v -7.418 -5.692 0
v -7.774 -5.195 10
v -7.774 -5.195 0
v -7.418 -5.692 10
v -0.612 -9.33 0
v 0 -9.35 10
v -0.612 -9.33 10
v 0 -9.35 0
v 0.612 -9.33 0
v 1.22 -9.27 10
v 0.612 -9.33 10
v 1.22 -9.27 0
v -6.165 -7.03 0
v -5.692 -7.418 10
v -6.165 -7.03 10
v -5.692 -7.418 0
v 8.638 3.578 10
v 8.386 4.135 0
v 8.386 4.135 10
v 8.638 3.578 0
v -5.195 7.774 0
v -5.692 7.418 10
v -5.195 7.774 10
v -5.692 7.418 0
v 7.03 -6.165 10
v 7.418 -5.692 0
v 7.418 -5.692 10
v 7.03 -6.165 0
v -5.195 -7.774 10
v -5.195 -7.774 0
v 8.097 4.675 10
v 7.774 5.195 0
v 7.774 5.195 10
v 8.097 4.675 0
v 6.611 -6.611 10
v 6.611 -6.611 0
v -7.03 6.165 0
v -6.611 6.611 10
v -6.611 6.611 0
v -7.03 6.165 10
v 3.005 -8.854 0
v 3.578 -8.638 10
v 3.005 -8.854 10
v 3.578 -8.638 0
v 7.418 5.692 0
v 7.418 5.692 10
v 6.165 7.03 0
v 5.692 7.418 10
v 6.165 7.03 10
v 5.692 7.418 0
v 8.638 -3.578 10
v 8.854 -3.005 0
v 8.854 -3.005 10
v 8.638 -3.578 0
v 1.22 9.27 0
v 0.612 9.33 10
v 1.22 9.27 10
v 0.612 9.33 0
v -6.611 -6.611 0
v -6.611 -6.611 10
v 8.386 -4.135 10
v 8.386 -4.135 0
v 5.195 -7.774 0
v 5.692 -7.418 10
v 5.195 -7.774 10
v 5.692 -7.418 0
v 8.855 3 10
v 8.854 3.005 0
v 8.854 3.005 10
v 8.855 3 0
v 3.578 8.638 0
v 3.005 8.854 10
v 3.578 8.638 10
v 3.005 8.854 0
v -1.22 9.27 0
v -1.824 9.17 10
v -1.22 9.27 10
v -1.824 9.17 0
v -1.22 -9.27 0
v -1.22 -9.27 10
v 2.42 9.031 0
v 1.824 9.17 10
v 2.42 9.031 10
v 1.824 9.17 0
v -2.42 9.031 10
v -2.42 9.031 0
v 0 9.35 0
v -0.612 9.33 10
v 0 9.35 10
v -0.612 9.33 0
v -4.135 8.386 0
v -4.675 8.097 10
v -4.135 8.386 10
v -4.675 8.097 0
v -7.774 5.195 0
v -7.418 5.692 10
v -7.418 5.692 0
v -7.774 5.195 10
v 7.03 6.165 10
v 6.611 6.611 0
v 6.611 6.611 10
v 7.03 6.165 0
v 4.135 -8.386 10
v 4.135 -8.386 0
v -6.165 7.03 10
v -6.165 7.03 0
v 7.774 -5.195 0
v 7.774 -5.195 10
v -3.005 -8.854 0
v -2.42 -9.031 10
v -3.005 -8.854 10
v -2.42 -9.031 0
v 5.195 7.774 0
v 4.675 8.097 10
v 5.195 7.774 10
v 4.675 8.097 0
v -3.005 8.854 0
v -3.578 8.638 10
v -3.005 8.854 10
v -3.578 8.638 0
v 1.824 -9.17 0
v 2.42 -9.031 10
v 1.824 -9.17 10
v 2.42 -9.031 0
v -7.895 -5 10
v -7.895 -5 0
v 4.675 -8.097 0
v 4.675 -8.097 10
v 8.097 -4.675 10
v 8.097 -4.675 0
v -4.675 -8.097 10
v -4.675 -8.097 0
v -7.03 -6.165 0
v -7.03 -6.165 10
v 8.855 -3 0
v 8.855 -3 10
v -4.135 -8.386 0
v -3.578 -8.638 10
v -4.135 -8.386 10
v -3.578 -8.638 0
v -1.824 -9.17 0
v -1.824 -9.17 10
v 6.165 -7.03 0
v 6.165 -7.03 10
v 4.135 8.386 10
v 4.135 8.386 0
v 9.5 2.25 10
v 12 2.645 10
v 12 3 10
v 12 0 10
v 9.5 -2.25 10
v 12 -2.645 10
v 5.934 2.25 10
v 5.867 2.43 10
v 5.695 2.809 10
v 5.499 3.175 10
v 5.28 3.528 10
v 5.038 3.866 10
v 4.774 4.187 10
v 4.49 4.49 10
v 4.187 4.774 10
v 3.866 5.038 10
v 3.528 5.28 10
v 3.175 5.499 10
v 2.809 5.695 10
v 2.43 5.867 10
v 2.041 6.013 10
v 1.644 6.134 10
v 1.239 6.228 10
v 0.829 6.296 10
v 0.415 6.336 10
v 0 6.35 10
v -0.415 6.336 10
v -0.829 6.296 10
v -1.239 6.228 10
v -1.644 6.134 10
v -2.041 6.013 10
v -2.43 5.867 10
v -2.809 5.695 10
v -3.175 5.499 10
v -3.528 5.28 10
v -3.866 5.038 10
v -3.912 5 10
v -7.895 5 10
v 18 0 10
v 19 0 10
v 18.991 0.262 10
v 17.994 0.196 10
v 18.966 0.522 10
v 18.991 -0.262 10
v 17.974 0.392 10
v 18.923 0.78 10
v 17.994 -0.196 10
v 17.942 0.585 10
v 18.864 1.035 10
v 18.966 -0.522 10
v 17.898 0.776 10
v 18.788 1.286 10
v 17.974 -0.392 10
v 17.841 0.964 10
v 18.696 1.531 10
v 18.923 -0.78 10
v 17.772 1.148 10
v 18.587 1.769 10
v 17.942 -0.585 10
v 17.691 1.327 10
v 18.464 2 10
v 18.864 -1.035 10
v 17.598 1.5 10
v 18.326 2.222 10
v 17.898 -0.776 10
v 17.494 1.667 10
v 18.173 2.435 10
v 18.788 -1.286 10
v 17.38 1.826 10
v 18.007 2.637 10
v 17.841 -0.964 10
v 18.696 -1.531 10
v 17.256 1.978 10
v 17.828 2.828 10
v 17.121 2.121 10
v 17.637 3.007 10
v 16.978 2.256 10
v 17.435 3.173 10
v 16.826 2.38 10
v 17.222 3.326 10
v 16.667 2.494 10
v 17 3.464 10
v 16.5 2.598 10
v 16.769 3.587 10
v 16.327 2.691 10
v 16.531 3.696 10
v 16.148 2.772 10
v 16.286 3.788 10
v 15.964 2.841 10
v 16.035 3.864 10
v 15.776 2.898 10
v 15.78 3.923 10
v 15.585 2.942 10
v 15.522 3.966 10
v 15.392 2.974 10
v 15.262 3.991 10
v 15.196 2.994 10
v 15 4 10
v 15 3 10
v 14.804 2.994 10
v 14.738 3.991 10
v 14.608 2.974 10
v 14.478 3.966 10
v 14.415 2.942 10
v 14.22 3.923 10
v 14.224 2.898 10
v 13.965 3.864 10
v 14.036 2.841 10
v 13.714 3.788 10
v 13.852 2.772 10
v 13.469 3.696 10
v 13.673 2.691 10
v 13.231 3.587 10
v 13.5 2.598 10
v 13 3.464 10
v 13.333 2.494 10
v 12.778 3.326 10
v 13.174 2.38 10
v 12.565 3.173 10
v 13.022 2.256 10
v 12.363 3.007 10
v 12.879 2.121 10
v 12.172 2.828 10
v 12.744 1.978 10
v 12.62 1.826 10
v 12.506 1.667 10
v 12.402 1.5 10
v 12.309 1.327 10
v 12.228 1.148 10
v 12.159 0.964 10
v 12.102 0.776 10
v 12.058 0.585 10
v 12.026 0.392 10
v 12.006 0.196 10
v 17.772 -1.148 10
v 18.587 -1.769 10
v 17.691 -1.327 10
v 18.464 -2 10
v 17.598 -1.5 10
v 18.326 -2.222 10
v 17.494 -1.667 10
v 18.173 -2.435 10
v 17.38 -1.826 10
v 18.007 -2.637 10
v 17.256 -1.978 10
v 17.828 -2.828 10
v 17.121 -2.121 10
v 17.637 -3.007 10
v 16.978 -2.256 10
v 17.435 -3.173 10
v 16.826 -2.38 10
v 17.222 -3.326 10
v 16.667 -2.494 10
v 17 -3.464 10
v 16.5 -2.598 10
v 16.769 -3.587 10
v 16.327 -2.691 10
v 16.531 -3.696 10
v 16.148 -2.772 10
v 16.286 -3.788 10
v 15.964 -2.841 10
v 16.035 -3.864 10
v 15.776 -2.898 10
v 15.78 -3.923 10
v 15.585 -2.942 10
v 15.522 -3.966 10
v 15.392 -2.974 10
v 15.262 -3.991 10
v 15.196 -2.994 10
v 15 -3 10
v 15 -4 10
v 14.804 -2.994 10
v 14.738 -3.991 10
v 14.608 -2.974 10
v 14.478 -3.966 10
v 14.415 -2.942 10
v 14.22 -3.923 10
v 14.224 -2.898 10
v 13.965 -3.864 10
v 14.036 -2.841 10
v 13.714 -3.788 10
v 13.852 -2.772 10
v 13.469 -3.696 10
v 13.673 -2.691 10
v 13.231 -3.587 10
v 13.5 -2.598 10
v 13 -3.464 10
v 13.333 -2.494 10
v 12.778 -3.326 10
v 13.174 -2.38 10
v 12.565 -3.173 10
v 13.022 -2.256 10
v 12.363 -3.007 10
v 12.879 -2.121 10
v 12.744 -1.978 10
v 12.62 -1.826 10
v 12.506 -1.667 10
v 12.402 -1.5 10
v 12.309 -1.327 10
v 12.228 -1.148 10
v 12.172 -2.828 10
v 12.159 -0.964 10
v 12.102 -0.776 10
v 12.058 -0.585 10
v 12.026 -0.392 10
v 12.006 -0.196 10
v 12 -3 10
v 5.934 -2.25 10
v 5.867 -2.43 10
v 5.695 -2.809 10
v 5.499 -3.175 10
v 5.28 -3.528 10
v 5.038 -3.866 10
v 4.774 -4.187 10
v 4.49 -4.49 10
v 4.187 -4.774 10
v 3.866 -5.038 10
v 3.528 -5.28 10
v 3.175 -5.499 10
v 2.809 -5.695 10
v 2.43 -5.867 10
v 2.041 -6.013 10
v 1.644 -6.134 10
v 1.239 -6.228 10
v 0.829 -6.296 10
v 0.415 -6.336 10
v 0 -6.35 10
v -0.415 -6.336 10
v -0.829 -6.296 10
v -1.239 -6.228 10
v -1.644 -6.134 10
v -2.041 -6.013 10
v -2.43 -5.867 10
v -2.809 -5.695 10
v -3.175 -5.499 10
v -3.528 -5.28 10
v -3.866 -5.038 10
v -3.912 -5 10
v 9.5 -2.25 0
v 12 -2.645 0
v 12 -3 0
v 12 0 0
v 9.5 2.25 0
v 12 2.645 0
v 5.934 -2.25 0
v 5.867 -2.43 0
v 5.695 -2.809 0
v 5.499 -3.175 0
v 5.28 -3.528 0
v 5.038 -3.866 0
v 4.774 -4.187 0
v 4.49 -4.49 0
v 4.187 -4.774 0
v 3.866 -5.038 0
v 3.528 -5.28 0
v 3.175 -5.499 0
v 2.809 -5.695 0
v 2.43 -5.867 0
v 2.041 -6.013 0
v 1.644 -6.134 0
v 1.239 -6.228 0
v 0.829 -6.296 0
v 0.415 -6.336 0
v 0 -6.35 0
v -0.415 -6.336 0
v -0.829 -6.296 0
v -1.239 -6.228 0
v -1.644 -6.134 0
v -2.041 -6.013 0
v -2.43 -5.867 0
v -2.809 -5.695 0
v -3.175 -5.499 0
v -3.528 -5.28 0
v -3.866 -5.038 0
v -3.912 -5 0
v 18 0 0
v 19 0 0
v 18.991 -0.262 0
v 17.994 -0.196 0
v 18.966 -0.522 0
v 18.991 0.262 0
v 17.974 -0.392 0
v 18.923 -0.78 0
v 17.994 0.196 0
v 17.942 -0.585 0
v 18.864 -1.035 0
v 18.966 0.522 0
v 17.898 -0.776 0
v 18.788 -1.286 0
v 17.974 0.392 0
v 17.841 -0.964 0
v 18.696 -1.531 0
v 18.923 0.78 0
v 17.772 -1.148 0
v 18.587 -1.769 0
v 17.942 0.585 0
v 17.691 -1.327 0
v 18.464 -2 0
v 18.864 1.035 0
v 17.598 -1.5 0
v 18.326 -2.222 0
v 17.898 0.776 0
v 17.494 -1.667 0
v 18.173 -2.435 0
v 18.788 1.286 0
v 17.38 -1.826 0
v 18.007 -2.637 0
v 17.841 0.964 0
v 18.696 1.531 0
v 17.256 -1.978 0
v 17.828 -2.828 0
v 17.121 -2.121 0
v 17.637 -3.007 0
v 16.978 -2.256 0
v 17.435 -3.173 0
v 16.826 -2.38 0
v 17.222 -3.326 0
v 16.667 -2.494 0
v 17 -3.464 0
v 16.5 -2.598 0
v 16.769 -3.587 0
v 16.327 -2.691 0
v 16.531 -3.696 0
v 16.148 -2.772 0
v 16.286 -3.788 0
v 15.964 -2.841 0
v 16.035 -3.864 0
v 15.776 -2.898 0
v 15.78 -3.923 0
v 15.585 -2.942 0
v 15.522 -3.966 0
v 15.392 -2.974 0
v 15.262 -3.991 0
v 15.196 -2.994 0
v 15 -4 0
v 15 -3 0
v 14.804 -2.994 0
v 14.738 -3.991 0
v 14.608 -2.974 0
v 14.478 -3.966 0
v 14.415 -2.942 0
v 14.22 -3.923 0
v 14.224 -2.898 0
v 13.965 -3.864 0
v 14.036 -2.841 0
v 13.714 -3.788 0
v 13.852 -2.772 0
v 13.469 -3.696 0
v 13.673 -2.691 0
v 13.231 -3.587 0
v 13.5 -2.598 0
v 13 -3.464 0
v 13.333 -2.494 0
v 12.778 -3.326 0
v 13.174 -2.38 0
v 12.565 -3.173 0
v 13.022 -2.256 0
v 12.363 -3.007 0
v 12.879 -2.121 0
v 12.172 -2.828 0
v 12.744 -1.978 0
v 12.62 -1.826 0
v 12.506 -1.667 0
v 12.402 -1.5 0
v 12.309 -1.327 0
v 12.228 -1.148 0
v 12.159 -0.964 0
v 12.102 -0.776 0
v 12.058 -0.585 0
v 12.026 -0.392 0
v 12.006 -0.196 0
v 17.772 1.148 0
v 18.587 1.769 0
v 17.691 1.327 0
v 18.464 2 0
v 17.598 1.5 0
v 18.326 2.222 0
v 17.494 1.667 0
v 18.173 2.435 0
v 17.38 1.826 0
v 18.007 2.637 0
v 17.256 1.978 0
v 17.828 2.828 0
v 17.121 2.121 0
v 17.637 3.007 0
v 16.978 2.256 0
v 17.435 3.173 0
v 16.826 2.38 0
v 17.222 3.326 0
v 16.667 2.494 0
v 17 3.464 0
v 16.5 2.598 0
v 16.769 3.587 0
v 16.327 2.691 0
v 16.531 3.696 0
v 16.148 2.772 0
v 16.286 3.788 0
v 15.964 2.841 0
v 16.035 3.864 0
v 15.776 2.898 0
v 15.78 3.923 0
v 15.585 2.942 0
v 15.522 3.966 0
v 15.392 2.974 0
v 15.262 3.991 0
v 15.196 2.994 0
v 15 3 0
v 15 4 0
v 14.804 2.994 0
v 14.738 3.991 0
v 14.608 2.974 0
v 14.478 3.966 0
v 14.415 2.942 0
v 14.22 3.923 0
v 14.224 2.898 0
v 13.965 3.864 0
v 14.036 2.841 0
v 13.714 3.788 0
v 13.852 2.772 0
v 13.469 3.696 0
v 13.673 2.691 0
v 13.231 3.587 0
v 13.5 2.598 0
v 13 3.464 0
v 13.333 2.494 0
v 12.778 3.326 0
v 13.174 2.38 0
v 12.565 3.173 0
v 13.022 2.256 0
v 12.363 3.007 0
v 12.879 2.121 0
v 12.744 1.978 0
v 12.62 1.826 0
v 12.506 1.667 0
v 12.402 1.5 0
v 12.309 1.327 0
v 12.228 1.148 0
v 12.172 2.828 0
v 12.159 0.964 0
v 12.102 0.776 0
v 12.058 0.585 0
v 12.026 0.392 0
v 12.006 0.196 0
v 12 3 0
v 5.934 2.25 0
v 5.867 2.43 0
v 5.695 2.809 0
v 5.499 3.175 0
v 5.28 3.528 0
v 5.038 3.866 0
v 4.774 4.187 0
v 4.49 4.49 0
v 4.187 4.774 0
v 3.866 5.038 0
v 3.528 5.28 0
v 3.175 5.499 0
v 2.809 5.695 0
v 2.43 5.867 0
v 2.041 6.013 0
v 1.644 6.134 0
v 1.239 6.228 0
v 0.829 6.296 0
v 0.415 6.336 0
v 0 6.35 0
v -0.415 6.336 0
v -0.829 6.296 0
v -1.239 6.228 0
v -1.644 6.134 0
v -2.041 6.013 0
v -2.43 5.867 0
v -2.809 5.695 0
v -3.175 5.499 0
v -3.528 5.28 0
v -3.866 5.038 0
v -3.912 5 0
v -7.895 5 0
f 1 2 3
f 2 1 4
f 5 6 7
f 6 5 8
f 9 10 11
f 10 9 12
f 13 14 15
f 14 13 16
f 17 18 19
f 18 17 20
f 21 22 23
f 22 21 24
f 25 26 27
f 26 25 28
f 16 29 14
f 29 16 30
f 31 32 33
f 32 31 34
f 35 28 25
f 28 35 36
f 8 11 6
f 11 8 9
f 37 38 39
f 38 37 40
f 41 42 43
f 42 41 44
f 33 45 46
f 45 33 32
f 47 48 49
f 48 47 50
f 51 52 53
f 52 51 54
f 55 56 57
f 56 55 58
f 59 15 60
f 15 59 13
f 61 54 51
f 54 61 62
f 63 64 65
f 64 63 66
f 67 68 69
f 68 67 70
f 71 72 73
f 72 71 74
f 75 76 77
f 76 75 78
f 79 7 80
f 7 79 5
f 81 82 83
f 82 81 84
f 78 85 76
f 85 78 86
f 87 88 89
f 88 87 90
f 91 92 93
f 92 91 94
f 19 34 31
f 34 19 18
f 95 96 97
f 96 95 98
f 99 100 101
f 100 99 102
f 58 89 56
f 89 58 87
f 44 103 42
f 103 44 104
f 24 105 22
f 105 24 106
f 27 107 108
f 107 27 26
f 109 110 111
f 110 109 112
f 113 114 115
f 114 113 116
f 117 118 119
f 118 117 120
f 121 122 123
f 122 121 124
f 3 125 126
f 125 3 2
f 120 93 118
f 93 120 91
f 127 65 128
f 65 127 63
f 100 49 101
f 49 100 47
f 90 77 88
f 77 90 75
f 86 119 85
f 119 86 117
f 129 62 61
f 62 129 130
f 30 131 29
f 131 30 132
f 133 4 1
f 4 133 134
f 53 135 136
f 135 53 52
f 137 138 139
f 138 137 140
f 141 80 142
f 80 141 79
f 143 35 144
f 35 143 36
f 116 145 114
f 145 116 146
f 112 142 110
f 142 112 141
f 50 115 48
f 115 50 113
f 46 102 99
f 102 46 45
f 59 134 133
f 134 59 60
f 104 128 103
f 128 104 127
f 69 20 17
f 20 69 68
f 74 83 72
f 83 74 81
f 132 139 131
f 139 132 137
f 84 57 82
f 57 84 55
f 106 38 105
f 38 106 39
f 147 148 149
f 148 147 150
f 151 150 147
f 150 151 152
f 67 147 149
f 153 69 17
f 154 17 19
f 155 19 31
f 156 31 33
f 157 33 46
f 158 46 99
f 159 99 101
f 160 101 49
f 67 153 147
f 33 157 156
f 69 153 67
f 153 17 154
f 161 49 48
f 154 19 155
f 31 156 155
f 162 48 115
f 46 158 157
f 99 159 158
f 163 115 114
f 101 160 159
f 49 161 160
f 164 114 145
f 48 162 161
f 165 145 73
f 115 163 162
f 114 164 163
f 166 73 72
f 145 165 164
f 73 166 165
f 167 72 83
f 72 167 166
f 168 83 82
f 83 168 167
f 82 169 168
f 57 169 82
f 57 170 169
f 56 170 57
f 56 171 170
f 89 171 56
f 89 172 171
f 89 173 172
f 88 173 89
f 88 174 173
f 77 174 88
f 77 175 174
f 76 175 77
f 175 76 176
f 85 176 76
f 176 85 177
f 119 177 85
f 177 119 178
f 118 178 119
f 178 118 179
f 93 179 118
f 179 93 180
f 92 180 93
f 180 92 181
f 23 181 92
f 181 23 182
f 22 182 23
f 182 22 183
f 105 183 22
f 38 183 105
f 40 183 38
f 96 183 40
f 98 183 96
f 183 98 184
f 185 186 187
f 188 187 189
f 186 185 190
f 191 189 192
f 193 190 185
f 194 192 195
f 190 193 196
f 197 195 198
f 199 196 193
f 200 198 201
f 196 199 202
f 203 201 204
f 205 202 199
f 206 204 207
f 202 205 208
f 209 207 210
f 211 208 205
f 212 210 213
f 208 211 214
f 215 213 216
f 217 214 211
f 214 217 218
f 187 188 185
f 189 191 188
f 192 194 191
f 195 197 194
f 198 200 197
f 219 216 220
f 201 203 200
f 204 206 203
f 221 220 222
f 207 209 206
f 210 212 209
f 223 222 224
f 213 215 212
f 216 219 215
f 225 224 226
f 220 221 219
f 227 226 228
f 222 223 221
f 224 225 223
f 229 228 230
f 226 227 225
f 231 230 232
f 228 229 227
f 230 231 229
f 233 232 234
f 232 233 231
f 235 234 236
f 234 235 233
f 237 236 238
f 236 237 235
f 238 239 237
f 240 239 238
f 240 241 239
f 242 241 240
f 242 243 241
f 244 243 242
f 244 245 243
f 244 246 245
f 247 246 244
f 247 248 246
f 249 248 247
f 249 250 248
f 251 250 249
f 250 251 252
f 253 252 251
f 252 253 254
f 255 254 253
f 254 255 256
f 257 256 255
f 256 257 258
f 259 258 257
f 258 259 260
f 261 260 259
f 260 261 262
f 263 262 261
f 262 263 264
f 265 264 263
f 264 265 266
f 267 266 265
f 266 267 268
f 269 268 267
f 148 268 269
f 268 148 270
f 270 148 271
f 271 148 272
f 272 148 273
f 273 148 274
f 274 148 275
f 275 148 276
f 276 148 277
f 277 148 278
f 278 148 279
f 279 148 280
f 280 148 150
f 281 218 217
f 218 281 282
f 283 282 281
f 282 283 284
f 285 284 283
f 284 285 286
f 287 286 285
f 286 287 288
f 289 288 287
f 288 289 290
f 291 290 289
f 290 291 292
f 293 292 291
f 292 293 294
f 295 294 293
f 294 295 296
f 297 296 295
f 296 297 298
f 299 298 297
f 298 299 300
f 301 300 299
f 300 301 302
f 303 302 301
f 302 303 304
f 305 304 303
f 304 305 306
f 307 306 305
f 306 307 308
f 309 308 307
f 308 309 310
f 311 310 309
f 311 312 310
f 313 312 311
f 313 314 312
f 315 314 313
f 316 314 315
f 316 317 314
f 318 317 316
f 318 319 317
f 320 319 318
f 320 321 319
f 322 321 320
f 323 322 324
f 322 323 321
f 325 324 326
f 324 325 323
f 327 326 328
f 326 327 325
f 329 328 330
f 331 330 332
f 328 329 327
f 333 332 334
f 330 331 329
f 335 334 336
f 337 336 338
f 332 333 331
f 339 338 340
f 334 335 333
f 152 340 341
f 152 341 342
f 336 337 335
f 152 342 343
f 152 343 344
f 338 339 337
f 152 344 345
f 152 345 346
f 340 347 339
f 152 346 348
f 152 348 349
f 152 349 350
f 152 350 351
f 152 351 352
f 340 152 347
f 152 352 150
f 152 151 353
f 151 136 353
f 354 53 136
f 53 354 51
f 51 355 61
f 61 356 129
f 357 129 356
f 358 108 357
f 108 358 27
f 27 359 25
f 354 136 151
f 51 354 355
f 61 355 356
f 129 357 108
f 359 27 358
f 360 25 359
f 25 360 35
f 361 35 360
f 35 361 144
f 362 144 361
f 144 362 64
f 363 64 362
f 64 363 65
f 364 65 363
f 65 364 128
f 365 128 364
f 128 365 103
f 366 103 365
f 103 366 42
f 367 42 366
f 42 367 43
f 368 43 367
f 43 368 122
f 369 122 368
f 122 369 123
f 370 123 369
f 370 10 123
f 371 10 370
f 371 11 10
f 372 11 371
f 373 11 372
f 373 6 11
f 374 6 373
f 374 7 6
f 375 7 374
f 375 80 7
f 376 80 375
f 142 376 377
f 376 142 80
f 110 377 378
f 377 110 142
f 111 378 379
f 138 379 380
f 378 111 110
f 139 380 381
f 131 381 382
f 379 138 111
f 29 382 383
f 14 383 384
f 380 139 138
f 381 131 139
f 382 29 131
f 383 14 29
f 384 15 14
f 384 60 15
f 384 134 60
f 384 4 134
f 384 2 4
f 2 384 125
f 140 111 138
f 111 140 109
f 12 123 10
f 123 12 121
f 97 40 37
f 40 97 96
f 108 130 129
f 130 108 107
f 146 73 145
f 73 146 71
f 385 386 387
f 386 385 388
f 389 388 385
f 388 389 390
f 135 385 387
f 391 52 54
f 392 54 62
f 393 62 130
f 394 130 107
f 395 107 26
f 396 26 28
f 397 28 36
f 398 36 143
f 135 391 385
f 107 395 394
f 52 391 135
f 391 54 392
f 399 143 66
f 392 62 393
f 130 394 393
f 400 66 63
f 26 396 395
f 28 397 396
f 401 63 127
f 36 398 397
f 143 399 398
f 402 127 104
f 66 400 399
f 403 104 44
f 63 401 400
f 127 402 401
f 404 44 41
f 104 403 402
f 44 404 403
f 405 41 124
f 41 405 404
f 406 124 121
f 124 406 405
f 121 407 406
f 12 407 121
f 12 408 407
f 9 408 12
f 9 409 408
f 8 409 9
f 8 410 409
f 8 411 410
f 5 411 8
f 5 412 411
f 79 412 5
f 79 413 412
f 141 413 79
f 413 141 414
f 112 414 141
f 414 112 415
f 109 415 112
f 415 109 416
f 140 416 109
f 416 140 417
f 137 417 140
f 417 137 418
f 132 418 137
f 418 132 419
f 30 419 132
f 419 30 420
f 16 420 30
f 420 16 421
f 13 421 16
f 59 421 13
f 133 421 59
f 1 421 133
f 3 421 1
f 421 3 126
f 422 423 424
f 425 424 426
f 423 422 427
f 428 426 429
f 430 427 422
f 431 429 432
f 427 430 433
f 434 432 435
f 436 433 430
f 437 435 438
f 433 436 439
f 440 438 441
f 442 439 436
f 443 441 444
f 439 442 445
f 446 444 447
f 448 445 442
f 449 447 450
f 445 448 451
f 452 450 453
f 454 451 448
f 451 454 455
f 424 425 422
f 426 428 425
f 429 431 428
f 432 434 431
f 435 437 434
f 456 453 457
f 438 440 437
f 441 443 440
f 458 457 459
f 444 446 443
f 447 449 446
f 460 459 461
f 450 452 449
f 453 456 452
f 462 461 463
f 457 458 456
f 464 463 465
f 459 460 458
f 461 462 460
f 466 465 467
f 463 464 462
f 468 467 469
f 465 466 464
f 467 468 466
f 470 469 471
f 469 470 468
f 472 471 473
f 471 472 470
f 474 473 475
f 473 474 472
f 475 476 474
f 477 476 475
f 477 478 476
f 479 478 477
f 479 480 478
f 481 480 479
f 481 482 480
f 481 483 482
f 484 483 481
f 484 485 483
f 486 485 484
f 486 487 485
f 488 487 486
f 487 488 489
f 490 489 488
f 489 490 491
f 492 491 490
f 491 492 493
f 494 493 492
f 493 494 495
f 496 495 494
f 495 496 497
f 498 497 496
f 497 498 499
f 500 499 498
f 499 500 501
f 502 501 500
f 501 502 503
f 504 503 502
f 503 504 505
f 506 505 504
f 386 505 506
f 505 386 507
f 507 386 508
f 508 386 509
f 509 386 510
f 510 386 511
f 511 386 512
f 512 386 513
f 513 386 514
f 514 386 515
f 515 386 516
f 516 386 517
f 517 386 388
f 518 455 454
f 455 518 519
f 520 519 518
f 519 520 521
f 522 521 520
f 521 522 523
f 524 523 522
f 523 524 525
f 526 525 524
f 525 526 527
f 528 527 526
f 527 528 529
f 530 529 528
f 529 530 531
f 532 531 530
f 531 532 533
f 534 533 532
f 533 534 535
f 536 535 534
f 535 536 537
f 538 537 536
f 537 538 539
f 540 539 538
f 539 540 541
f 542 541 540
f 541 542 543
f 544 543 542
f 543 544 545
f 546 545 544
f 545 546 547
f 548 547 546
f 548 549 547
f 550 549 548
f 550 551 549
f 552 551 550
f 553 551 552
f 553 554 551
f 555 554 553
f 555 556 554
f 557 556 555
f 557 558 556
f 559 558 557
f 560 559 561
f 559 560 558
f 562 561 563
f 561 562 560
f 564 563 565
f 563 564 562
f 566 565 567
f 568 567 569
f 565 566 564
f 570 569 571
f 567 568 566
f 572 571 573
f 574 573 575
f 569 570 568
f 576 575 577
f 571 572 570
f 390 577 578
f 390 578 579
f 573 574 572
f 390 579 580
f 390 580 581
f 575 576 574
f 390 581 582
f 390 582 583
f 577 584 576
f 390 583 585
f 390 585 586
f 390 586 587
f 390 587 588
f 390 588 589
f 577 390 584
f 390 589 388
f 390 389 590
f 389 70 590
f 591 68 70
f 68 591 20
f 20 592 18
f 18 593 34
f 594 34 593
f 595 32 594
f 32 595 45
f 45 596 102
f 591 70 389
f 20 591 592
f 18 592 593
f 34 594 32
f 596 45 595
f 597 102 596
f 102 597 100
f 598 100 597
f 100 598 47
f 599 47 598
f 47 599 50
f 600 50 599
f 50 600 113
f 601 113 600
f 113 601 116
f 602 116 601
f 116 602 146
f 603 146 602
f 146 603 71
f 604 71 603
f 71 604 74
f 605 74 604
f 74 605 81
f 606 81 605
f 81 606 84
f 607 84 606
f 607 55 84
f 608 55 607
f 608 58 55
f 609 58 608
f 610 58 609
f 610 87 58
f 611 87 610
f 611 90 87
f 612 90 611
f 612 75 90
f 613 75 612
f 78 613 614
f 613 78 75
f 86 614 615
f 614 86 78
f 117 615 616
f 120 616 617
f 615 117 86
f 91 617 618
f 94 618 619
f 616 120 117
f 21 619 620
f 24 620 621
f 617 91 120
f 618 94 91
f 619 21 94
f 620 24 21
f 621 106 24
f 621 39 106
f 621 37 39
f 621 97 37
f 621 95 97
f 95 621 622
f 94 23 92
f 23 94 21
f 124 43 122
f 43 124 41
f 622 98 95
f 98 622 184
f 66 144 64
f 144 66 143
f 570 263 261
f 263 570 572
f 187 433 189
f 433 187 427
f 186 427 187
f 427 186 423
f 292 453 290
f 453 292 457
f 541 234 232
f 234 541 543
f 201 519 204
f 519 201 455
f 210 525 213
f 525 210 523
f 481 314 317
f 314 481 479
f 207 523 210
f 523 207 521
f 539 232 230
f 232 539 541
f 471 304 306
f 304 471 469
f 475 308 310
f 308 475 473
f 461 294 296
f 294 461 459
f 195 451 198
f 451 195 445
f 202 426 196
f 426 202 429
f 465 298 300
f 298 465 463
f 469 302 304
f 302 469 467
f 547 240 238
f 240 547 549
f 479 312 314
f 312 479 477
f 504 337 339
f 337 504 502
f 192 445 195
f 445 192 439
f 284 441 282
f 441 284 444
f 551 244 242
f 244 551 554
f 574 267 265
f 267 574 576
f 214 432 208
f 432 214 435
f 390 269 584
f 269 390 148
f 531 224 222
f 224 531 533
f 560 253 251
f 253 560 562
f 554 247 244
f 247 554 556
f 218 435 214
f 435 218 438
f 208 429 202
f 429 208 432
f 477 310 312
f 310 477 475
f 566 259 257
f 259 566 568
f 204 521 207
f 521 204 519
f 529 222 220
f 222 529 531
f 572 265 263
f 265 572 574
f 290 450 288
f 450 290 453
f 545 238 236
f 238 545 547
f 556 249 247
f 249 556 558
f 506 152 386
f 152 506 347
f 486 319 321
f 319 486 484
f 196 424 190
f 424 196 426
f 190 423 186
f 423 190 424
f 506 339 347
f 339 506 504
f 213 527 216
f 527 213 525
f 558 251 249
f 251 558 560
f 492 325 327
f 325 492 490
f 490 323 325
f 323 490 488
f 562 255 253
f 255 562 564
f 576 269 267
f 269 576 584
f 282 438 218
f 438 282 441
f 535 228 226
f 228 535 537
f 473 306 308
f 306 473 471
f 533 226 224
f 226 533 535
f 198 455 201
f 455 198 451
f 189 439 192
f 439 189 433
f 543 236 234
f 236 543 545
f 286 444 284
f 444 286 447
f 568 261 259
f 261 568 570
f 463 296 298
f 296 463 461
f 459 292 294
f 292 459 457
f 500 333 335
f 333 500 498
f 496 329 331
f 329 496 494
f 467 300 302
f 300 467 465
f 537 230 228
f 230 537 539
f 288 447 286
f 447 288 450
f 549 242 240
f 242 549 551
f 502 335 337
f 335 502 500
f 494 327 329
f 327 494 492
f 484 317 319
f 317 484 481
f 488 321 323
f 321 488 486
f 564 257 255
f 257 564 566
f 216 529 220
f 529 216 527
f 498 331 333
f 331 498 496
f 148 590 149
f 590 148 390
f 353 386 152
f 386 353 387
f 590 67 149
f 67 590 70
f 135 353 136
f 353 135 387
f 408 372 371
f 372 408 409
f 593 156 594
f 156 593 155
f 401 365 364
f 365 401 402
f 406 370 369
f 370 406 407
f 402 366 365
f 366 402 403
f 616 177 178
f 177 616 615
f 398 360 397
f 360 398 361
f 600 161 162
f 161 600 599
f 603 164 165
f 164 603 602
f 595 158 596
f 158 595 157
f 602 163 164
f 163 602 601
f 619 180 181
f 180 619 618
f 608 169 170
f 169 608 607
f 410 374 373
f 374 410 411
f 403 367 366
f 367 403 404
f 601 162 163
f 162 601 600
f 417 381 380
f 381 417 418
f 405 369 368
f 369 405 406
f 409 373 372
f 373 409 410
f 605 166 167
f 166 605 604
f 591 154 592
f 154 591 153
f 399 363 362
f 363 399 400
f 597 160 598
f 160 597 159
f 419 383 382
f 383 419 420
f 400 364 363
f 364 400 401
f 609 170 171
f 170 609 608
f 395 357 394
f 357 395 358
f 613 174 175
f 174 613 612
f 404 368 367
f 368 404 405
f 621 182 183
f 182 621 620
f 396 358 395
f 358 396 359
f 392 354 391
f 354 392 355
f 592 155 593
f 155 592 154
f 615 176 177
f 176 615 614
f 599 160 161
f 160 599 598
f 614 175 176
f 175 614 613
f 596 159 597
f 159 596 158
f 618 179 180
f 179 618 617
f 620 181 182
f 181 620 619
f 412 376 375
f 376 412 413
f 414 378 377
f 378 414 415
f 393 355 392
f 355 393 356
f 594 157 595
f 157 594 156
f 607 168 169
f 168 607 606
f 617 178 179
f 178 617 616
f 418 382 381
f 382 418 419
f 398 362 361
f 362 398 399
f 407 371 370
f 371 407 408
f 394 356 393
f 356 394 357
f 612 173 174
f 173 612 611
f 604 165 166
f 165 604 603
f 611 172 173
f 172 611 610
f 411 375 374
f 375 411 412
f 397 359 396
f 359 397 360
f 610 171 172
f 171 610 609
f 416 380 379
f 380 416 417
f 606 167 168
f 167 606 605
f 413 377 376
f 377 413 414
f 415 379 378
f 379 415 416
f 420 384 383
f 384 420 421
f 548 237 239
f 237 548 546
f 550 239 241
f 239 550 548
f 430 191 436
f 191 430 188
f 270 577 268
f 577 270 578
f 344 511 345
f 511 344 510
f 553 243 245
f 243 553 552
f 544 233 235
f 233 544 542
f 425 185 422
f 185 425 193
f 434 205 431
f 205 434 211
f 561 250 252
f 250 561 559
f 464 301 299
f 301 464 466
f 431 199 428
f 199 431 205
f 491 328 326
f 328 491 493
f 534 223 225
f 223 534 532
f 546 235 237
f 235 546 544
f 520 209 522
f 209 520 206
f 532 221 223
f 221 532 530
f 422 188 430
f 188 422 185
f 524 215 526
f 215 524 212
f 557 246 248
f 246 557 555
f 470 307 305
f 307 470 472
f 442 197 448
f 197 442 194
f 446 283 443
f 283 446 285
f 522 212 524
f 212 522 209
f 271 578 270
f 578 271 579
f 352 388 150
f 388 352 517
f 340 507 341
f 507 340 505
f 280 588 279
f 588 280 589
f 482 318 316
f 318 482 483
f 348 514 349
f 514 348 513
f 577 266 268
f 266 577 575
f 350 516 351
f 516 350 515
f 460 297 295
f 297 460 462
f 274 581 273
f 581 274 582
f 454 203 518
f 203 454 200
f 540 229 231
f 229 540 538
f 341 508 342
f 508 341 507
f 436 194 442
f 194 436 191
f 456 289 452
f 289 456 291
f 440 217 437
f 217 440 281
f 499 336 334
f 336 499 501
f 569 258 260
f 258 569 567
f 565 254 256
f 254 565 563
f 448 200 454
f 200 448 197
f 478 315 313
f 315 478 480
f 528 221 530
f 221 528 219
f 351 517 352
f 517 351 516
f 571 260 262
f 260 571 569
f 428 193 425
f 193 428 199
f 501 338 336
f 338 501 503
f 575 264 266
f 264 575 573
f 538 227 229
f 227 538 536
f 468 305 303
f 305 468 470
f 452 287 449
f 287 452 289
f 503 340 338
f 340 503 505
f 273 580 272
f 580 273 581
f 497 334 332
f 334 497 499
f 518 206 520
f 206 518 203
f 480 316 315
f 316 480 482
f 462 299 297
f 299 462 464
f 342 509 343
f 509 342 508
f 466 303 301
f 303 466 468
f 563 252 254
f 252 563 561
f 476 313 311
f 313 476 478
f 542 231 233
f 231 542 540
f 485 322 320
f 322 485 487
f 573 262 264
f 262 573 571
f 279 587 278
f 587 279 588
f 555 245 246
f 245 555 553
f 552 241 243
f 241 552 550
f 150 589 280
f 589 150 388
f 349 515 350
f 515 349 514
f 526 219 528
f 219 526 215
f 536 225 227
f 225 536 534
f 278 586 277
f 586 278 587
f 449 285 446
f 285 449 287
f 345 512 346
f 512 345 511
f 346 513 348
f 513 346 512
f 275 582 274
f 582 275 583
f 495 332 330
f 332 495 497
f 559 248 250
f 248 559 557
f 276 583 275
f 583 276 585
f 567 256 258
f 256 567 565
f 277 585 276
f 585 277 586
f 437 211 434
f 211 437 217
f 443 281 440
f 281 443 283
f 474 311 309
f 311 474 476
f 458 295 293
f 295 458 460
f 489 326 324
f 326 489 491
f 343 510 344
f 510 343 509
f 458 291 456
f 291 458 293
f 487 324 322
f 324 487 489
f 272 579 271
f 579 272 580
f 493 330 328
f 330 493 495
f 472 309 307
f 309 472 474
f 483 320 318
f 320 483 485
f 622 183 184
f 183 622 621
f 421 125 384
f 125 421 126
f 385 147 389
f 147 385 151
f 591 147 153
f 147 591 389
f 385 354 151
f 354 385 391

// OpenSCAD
// Tubing clip for 12.7 mm lab stand rod
// Print orientation: flat on bed, extruded upward in +Z

// ---------- Parameters ----------
ring_od        = 18.7;   // rod ring outer diameter
ring_id        = 12.7;   // rod ring inner diameter (rod bore)
ring_wall      = 3;      // rod ring wall thickness
ring_open      = 10;     // rod ring opening width (along -X)

tube_od        = 8;      // tubing ring outer diameter
tube_id        = 6;      // tubing ring inner diameter
tube_wall      = 2;      // tubing ring wall thickness
tube_open      = 4.5;    // tubing ring opening width (along +X)

bridge_x0      = 8;      // bridge start (X)
bridge_x1      = 12;     // bridge end (X)
bridge_w       = 6;      // bridge width (Y)

eps            = 0.5;    // cutter overshoot past faces
$fn            = 96;     // curve resolution

// ---------- Derived ----------
ring_r = ring_od / 2;
tube_r = tube_od / 2;

// ---------- Model ----------
difference() {
    union() {
        // Rod ring
        cylinder(h = 10, r = ring_r);
        // Tubing ring
        translate([15, 0, 0])
            cylinder(h = 10, r = tube_r);
        // Bridge
        translate([bridge_x0, -bridge_w / 2, 0])
            cube([bridge_x1 - bridge_x0, bridge_w, 10]);
    }
    // Rod bore
    translate([0, 0, -eps])
        cylinder(h = 10 + 2 * eps, d = ring_id);
    // Tubing bore
    translate([15, 0, -eps])
        cylinder(h = 10 + 2 * eps, d = tube_id);
    // Rod ring opening (-X side)
    translate([-ring_r, -ring_open / 2, -eps])
        cube([ring_open + 2 * eps, ring_open, 10 + 2 * eps]);
    // Tubing ring opening (+X side)
    translate([tube_r, -tube_open / 2, -eps])
        cube([tube_open + 2 * eps, tube_open, 10 + 2 * eps]);
}
